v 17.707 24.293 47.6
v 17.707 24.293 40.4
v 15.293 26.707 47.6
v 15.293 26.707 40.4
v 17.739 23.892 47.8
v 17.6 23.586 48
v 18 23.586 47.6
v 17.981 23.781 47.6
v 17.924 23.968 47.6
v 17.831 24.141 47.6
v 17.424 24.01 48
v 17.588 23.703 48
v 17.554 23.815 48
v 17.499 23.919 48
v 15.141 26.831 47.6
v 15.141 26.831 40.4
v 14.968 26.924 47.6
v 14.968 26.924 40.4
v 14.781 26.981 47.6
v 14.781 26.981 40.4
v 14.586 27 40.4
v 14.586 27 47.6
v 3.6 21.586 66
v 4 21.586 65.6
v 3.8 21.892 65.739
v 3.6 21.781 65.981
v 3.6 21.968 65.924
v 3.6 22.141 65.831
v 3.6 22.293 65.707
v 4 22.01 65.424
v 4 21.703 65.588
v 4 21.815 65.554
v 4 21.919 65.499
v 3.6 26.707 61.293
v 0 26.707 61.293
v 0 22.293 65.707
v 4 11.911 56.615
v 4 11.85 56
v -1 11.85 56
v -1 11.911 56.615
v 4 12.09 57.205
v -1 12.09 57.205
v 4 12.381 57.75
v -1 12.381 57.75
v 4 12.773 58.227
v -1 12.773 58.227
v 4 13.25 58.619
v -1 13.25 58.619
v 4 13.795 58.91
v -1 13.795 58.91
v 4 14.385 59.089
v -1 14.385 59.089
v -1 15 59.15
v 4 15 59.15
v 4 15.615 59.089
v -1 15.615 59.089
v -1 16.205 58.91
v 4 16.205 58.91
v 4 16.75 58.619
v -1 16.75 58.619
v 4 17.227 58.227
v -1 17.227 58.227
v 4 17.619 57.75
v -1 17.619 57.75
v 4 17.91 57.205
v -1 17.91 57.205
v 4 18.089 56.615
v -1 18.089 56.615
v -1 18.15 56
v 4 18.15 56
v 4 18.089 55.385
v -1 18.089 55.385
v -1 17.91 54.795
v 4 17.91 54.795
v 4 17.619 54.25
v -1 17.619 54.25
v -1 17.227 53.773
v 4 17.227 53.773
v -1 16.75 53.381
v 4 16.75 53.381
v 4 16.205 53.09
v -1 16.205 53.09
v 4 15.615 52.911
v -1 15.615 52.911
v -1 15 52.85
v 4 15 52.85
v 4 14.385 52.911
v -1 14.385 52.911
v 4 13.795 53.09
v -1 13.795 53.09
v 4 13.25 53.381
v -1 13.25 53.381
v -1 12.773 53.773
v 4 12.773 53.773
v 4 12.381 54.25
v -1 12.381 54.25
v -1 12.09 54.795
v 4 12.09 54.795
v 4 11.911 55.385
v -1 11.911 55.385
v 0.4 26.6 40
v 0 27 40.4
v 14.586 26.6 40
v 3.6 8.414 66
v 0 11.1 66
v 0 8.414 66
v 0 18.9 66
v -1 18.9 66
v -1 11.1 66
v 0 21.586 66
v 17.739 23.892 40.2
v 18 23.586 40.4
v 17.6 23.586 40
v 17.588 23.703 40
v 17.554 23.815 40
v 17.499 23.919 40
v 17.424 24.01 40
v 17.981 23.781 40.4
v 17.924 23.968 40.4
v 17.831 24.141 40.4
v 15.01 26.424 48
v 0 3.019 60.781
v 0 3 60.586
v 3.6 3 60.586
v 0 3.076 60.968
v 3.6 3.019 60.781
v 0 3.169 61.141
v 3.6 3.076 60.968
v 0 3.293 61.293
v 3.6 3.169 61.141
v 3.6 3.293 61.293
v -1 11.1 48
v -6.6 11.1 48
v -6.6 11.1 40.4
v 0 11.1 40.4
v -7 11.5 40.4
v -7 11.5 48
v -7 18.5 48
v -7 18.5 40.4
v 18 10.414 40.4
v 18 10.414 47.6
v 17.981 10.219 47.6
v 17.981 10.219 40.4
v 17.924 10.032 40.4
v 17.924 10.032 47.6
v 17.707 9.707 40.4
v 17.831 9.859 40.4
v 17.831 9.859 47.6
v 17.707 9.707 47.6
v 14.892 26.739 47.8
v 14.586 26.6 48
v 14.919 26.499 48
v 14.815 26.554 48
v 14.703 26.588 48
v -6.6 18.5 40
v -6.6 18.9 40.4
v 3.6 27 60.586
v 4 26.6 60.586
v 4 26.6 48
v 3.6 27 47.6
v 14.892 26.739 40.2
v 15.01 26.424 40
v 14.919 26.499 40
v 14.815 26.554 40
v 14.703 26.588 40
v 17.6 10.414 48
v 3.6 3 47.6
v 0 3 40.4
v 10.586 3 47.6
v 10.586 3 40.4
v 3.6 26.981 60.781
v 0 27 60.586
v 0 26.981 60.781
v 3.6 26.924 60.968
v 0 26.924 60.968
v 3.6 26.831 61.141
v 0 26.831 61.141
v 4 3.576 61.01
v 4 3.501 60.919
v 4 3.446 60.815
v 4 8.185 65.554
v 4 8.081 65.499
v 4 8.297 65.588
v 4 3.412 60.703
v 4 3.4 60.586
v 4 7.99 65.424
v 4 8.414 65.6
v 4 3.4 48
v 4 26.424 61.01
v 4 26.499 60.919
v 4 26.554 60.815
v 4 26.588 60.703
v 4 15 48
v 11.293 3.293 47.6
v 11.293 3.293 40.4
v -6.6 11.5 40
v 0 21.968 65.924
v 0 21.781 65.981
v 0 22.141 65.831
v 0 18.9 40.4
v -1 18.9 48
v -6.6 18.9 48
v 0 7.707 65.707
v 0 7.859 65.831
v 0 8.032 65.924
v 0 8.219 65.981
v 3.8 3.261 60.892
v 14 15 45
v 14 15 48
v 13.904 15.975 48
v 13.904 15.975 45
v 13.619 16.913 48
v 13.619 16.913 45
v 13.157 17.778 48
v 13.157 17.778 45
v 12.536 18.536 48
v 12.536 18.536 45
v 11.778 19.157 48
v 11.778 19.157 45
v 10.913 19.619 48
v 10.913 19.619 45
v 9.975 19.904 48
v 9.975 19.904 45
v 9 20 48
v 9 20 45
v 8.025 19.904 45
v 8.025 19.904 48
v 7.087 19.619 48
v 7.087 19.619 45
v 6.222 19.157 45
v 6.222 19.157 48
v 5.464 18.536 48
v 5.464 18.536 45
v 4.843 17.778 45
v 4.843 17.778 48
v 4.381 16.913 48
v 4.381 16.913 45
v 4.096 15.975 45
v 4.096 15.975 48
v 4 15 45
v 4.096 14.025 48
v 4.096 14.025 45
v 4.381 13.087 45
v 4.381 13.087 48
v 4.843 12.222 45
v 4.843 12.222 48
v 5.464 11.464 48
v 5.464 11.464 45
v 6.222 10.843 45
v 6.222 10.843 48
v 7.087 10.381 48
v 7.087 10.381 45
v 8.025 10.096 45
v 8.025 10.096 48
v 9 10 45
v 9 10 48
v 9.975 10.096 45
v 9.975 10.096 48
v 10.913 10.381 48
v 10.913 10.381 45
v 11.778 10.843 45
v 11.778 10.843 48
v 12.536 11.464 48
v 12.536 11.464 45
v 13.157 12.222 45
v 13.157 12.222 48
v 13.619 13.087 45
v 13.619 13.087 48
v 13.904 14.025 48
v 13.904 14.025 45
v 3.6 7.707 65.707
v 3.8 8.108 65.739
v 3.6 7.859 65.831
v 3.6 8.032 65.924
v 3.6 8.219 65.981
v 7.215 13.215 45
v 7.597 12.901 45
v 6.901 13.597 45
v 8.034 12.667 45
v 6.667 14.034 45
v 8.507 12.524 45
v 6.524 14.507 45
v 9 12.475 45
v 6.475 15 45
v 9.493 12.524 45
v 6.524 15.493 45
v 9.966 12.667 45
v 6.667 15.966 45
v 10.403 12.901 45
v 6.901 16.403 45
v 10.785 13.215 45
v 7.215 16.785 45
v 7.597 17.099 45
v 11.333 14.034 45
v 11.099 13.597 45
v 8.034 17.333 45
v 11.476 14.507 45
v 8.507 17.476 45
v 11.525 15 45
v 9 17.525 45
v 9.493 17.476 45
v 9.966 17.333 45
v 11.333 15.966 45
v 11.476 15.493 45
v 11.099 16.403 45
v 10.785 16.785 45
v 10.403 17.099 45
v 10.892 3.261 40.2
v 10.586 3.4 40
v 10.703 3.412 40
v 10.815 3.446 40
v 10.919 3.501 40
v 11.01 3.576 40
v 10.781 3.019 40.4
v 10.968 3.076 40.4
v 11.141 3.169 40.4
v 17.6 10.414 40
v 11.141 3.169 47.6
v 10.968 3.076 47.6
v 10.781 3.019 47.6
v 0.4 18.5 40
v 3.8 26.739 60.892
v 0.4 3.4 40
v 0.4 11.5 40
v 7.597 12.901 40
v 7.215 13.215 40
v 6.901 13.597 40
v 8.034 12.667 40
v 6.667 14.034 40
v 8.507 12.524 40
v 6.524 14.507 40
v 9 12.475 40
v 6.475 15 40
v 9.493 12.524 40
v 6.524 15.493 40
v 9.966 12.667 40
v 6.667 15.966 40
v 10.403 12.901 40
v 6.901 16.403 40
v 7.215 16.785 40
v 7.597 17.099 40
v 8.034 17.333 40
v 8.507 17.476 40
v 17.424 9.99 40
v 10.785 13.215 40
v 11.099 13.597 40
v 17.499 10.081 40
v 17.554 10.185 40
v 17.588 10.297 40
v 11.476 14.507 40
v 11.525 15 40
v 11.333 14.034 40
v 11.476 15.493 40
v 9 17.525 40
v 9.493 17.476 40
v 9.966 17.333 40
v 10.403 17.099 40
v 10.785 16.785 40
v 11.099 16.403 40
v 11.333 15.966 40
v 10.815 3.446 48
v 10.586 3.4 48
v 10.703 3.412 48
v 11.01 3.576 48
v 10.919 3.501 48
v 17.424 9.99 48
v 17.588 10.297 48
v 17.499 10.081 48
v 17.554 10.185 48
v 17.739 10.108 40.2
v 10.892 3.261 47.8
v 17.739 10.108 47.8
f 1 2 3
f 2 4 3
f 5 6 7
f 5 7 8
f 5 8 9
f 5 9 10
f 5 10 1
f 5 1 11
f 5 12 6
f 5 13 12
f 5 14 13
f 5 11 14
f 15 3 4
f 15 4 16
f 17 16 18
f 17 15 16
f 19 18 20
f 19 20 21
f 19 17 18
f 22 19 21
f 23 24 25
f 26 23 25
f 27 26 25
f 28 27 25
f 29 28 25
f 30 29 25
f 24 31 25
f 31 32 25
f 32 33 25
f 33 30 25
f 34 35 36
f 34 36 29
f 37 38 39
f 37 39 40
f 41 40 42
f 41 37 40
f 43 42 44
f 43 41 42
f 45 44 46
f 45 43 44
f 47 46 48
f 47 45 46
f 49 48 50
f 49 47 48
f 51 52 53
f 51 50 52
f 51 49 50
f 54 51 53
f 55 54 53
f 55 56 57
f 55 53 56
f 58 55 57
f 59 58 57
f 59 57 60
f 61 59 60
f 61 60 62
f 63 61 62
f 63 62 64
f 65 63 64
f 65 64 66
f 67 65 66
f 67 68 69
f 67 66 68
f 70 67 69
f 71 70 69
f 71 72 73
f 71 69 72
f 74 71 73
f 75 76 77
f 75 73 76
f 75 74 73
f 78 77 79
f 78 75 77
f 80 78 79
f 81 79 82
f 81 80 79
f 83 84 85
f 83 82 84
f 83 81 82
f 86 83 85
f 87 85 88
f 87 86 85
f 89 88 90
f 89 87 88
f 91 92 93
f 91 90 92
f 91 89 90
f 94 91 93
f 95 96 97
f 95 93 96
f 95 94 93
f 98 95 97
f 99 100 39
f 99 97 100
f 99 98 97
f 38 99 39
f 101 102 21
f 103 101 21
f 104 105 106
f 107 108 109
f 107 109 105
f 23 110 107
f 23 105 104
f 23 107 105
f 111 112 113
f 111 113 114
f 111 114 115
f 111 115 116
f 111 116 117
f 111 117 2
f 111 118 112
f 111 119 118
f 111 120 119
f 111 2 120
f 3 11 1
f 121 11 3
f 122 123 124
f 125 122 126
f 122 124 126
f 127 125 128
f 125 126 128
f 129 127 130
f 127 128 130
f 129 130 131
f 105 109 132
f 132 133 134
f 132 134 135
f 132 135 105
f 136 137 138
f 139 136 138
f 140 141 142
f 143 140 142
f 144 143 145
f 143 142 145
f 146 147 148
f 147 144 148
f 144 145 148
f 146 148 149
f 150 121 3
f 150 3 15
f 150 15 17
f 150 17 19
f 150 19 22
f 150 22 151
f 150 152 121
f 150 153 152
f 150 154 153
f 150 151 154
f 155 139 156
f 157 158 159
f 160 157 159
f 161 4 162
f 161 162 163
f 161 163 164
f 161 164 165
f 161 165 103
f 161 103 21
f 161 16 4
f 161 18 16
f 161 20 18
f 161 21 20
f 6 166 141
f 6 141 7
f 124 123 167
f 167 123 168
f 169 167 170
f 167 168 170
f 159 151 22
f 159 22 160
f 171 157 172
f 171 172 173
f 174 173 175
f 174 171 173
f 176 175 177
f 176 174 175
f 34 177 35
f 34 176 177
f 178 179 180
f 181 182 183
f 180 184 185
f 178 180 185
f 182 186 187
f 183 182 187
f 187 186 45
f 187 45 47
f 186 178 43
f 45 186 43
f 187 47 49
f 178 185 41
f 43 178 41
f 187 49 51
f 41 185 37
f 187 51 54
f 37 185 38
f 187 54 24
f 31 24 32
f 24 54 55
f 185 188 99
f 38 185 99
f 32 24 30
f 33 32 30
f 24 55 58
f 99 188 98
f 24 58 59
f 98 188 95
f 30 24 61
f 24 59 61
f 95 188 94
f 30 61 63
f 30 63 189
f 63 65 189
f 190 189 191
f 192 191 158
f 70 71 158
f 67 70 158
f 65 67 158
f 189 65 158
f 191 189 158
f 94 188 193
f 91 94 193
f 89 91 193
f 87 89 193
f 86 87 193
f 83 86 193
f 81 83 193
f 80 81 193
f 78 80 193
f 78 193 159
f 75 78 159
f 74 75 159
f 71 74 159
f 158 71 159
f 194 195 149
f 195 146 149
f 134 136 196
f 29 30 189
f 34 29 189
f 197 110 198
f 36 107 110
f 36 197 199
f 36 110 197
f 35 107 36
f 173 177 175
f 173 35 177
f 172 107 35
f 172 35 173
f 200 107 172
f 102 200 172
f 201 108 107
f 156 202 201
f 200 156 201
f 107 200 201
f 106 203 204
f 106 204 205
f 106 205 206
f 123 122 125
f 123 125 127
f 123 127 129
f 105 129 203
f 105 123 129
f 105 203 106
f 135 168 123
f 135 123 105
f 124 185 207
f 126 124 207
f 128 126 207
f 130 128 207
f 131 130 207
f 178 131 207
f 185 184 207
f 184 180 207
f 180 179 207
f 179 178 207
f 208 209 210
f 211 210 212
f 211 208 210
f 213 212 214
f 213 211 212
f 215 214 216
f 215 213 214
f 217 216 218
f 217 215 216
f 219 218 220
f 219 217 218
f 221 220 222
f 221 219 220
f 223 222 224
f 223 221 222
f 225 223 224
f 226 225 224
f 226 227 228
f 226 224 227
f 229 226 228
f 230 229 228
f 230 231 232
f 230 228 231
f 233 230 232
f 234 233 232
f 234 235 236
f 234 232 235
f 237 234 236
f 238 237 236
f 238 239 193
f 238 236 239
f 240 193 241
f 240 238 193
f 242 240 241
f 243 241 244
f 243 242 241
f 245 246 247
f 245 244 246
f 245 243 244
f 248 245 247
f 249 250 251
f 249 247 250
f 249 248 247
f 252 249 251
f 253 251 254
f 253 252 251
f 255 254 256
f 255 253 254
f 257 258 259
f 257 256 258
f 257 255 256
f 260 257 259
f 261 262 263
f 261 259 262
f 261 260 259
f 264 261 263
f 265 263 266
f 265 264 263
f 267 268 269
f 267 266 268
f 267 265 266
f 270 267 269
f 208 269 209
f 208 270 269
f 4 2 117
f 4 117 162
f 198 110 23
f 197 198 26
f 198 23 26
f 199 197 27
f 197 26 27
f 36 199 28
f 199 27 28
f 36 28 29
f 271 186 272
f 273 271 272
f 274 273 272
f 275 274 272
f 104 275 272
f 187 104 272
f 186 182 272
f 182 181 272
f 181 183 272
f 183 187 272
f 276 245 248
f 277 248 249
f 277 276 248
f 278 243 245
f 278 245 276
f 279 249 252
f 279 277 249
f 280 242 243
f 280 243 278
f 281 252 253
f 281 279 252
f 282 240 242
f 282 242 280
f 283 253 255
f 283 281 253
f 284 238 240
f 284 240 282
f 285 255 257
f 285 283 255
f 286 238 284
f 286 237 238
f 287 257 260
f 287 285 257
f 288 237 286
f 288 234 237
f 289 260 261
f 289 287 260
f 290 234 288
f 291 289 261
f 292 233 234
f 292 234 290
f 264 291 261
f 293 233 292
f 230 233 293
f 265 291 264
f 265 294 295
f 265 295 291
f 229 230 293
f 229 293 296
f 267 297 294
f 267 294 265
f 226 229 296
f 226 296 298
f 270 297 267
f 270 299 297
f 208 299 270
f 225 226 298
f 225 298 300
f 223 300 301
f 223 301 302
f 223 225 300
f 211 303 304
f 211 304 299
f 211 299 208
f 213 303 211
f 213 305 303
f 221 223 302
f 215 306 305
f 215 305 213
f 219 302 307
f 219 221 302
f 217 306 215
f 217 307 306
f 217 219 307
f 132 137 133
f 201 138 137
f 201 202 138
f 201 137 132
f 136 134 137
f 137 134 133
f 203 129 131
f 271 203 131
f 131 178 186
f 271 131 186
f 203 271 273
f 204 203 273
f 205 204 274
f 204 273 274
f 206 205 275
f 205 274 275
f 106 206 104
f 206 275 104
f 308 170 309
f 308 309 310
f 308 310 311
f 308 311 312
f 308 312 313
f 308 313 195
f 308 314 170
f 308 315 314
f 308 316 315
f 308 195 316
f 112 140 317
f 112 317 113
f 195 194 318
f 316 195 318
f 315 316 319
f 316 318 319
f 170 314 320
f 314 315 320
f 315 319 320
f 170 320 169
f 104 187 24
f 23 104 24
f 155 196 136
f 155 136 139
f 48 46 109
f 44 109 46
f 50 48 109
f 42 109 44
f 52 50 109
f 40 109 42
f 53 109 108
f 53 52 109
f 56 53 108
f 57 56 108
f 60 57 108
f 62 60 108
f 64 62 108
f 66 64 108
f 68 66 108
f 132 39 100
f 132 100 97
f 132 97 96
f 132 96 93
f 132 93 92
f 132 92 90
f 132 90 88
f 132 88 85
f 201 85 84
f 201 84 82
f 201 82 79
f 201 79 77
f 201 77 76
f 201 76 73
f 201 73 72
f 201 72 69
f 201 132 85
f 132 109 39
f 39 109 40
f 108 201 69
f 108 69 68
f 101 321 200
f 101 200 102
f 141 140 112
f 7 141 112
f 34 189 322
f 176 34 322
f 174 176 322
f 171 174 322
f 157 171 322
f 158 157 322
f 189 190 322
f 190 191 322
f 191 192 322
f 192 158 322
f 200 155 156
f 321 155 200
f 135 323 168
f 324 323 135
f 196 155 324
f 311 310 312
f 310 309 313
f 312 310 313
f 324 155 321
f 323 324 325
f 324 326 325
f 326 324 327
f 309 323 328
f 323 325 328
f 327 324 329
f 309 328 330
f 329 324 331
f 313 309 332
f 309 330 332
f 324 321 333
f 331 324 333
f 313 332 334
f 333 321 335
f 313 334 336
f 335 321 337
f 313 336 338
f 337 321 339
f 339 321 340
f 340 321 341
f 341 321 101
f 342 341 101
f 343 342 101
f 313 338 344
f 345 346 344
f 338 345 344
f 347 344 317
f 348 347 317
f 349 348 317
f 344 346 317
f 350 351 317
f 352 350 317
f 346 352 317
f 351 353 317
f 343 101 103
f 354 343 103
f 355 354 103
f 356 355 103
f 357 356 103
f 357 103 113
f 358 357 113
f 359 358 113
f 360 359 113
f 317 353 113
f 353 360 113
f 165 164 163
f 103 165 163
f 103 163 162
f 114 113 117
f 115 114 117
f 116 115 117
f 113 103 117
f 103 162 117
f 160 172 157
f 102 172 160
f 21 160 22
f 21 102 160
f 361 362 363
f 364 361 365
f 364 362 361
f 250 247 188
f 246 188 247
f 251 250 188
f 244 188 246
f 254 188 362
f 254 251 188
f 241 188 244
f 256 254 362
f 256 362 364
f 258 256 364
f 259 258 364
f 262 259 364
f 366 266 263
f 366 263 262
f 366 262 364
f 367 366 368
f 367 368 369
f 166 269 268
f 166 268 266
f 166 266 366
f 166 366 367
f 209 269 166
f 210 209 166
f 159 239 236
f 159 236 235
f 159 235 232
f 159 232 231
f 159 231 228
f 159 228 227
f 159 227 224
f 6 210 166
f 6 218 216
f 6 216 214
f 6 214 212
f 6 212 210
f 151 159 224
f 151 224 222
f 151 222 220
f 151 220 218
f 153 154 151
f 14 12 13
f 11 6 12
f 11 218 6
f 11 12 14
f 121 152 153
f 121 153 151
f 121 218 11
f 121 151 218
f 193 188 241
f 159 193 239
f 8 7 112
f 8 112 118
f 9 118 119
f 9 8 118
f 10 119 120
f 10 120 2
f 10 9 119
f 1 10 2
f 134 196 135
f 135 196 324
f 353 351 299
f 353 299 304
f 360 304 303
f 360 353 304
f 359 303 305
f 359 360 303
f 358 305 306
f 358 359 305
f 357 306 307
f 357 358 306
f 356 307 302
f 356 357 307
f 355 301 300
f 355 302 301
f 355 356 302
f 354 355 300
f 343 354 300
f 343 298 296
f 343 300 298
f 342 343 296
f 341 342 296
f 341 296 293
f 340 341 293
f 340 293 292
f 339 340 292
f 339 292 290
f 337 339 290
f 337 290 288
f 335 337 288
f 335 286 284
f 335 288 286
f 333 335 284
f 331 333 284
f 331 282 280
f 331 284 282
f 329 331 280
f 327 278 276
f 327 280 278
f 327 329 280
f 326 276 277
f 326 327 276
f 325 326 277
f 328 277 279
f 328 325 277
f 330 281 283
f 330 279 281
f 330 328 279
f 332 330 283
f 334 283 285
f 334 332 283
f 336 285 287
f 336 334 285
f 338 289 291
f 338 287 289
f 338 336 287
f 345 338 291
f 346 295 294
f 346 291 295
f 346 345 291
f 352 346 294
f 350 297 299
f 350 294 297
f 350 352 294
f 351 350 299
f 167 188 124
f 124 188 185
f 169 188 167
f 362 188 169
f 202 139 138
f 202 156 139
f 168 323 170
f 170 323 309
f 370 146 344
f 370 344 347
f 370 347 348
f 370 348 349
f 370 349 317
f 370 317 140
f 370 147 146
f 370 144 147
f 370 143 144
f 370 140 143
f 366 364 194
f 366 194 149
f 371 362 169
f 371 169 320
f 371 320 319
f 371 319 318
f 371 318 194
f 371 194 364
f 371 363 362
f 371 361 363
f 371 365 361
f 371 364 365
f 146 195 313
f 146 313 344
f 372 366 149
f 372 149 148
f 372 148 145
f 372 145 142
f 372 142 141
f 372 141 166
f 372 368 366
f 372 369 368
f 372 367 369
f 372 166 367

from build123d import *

# Parameters (mm, degrees)
CYLINDER014_R     = 3.15
CYLINDER014_DEPTH = 15
BOX016_W          = 4
BOX016_H          = 24
BOX016_DEPTH      = 26
CHAMFER024_SIZE   = 5
FILLET006_R       = 1
CHAMFER025_SIZE   = 0.4
CYLINDER012_R     = 2.525
CYLINDER012_DEPTH = 35
CYLINDER013_R     = 5
CYLINDER013_DEPTH = 5
BOX018_W          = 18
BOX018_H          = 24
BOX018_DEPTH      = 8
CHAMFER021_SIZE   = 7
CHAMFER022_SIZE   = 3
FILLET005_R       = 1
CHAMFER023_SIZE   = 0.4
BOX019_W          = 2
BOX019_H          = 7.8
BOX019_DEPTH      = 18
BOX017_W          = 8
BOX017_H          = 7.8
BOX017_DEPTH      = 8
CHAMFER026_SIZE   = 0.4


with BuildPart() as cylinder014:
    # Cylinder014 → Cylinder014 (new body)
    with BuildSketch(Plane(origin=(9, 15, 56), x_dir=(0, -1, 0), z_dir=(-1, 0, 0))):
        Circle(CYLINDER014_R)
    extrude(amount=CYLINDER014_DEPTH)


with BuildPart() as chamfer025:
    # Box016 → Box016 (new body)
    with BuildSketch(Plane(origin=(0, 3, 40), x_dir=(1, 0, 0), z_dir=(0, 0, 1))):
        with Locations((2, 12)):
            Rectangle(BOX016_W, BOX016_H)
    extrude(amount=BOX016_DEPTH)

    # Chamfer024
    chamfer024_edges = [chamfer025.edges().sort_by_distance(p)[0] for p in [
        (2, 3, 66),
        (2, 27, 66),
    ]]
    chamfer(chamfer024_edges, length=CHAMFER024_SIZE)

    # Fillet006
    fillet006_edges = [chamfer025.edges().sort_by_distance(p)[0] for p in [
        (2, 3, 61),
        (2, 8, 66),
        (2, 22, 66),
        (2, 27, 61),
    ]]
    fillet(fillet006_edges, radius=FILLET006_R)

    # Chamfer025
    chamfer025_edges = [chamfer025.edges().sort_by_distance(p)[0] for p in [
        (0, 15, 40),
        (4, 3, 50.292893),
        (2, 3, 40),
        (4, 3.07612, 60.96847),
        (2, 27, 40),
        (4, 15, 40),
        (4, 5.5, 63.5),
        (4, 27, 50.292893),
        (4, 8.03153, 65.92388),
        (4, 26.92388, 60.96847),
        (4, 15, 66),
        (4, 24.5, 63.5),
        (4, 21.96847, 65.92388),
    ]]
    chamfer(chamfer025_edges, length=CHAMFER025_SIZE)


with BuildPart() as cylinder012:
    # Cylinder012 → Cylinder012 (new body)
    with BuildSketch(Plane(origin=(9, 15, 32.7), x_dir=(1, 0, 0), z_dir=(0, 0, 1))):
        Circle(CYLINDER012_R)
    extrude(amount=CYLINDER012_DEPTH)


with BuildPart() as cylinder013:
    # Cylinder013 → Cylinder013 (new body)
    with BuildSketch(Plane(origin=(9, 15, 45), x_dir=(1, 0, 0), z_dir=(0, 0, 1))):
        Circle(CYLINDER013_R)
    extrude(amount=CYLINDER013_DEPTH)


with BuildPart() as cut002002002007004003:
    # Box018 → Box018 (new body)
    with BuildSketch(Plane(origin=(0, 3, 40), x_dir=(1, 0, 0), z_dir=(0, 0, 1))):
        with Locations((9, 12)):
            Rectangle(BOX018_W, BOX018_H)
    extrude(amount=BOX018_DEPTH)

    # Chamfer021
    chamfer021_edges = [cut002002002007004003.edges().sort_by_distance(p)[0] for p in [
        (18, 3, 44),
    ]]
    chamfer(chamfer021_edges, length=CHAMFER021_SIZE)

    # Chamfer022
    chamfer022_edges = [cut002002002007004003.edges().sort_by_distance(p)[0] for p in [
        (18, 27, 44),
    ]]
    chamfer(chamfer022_edges, length=CHAMFER022_SIZE)

    # Fillet005
    fillet005_edges = [cut002002002007004003.edges().sort_by_distance(p)[0] for p in [
        (18, 10, 44),
        (18, 24, 44),
        (15, 27, 44),
        (11, 3, 44),
    ]]
    fillet(fillet005_edges, radius=FILLET005_R)

    # Chamfer023
    chamfer023_edges = [cut002002002007004003.edges().sort_by_distance(p)[0] for p in [
        (18, 17, 48),
        (18, 17, 40),
        (17.92388, 23.96847, 48),
        (16.5, 25.5, 48),
        (14.96847, 26.92388, 48),
        (7.292893, 27, 48),
        (0, 15, 48),
        (5.292893, 3, 48),
        (10.96847, 3.07612, 48),
        (14.5, 6.5, 48),
        (17.92388, 10.03153, 48),
        (17.92388, 10.03153, 40),
        (17.92388, 23.96847, 40),
        (16.5, 25.5, 40),
        (14.96847, 26.92388, 40),
        (7.292893, 27, 40),
        (0, 15, 40),
        (5.292893, 3, 40),
        (10.96847, 3.07612, 40),
        (14.5, 6.5, 40),
    ]]
    chamfer(chamfer023_edges, length=CHAMFER023_SIZE)

    # Cut002002002007004002: cut Cylinder013
    add(cylinder013.part, mode=Mode.SUBTRACT)

    # Cut002002002007004003: cut Cylinder012
    add(cylinder012.part, mode=Mode.SUBTRACT)


with BuildPart() as cube019:
    # Box019 → Box019 (new body)
    with BuildSketch(Plane(origin=(-1, 11.1, 48), x_dir=(1, 0, 0), z_dir=(0, 0, 1))):
        with Locations((1, 3.9)):
            Rectangle(BOX019_W, BOX019_H)
    extrude(amount=BOX019_DEPTH)


with BuildPart() as top_support_exp:
    # Box017 → Box017 (new body)
    with BuildSketch(Plane(origin=(-7, 11.1, 40), x_dir=(1, 0, 0), z_dir=(0, 0, 1))):
        with Locations((4, 3.9)):
            Rectangle(BOX017_W, BOX017_H)
    extrude(amount=BOX017_DEPTH)

    # Chamfer026
    chamfer026_edges = [top_support_exp.edges().sort_by_distance(p)[0] for p in [
        (-7, 11.1, 44),
        (-7, 18.9, 44),
        (-7, 15, 40),
        (-3, 11.1, 40),
        (-3, 18.9, 40),
    ]]
    chamfer(chamfer026_edges, length=CHAMFER026_SIZE)

    # Fusion006005: union Chamfer025, Cut002002002007004003, Cube019
    add(chamfer025.part)
    add(cut002002002007004003.part)
    add(cube019.part)

    # Cut002002002007004004: cut Cylinder014
    add(cylinder014.part, mode=Mode.SUBTRACT)


solid = top_support_exp.part
